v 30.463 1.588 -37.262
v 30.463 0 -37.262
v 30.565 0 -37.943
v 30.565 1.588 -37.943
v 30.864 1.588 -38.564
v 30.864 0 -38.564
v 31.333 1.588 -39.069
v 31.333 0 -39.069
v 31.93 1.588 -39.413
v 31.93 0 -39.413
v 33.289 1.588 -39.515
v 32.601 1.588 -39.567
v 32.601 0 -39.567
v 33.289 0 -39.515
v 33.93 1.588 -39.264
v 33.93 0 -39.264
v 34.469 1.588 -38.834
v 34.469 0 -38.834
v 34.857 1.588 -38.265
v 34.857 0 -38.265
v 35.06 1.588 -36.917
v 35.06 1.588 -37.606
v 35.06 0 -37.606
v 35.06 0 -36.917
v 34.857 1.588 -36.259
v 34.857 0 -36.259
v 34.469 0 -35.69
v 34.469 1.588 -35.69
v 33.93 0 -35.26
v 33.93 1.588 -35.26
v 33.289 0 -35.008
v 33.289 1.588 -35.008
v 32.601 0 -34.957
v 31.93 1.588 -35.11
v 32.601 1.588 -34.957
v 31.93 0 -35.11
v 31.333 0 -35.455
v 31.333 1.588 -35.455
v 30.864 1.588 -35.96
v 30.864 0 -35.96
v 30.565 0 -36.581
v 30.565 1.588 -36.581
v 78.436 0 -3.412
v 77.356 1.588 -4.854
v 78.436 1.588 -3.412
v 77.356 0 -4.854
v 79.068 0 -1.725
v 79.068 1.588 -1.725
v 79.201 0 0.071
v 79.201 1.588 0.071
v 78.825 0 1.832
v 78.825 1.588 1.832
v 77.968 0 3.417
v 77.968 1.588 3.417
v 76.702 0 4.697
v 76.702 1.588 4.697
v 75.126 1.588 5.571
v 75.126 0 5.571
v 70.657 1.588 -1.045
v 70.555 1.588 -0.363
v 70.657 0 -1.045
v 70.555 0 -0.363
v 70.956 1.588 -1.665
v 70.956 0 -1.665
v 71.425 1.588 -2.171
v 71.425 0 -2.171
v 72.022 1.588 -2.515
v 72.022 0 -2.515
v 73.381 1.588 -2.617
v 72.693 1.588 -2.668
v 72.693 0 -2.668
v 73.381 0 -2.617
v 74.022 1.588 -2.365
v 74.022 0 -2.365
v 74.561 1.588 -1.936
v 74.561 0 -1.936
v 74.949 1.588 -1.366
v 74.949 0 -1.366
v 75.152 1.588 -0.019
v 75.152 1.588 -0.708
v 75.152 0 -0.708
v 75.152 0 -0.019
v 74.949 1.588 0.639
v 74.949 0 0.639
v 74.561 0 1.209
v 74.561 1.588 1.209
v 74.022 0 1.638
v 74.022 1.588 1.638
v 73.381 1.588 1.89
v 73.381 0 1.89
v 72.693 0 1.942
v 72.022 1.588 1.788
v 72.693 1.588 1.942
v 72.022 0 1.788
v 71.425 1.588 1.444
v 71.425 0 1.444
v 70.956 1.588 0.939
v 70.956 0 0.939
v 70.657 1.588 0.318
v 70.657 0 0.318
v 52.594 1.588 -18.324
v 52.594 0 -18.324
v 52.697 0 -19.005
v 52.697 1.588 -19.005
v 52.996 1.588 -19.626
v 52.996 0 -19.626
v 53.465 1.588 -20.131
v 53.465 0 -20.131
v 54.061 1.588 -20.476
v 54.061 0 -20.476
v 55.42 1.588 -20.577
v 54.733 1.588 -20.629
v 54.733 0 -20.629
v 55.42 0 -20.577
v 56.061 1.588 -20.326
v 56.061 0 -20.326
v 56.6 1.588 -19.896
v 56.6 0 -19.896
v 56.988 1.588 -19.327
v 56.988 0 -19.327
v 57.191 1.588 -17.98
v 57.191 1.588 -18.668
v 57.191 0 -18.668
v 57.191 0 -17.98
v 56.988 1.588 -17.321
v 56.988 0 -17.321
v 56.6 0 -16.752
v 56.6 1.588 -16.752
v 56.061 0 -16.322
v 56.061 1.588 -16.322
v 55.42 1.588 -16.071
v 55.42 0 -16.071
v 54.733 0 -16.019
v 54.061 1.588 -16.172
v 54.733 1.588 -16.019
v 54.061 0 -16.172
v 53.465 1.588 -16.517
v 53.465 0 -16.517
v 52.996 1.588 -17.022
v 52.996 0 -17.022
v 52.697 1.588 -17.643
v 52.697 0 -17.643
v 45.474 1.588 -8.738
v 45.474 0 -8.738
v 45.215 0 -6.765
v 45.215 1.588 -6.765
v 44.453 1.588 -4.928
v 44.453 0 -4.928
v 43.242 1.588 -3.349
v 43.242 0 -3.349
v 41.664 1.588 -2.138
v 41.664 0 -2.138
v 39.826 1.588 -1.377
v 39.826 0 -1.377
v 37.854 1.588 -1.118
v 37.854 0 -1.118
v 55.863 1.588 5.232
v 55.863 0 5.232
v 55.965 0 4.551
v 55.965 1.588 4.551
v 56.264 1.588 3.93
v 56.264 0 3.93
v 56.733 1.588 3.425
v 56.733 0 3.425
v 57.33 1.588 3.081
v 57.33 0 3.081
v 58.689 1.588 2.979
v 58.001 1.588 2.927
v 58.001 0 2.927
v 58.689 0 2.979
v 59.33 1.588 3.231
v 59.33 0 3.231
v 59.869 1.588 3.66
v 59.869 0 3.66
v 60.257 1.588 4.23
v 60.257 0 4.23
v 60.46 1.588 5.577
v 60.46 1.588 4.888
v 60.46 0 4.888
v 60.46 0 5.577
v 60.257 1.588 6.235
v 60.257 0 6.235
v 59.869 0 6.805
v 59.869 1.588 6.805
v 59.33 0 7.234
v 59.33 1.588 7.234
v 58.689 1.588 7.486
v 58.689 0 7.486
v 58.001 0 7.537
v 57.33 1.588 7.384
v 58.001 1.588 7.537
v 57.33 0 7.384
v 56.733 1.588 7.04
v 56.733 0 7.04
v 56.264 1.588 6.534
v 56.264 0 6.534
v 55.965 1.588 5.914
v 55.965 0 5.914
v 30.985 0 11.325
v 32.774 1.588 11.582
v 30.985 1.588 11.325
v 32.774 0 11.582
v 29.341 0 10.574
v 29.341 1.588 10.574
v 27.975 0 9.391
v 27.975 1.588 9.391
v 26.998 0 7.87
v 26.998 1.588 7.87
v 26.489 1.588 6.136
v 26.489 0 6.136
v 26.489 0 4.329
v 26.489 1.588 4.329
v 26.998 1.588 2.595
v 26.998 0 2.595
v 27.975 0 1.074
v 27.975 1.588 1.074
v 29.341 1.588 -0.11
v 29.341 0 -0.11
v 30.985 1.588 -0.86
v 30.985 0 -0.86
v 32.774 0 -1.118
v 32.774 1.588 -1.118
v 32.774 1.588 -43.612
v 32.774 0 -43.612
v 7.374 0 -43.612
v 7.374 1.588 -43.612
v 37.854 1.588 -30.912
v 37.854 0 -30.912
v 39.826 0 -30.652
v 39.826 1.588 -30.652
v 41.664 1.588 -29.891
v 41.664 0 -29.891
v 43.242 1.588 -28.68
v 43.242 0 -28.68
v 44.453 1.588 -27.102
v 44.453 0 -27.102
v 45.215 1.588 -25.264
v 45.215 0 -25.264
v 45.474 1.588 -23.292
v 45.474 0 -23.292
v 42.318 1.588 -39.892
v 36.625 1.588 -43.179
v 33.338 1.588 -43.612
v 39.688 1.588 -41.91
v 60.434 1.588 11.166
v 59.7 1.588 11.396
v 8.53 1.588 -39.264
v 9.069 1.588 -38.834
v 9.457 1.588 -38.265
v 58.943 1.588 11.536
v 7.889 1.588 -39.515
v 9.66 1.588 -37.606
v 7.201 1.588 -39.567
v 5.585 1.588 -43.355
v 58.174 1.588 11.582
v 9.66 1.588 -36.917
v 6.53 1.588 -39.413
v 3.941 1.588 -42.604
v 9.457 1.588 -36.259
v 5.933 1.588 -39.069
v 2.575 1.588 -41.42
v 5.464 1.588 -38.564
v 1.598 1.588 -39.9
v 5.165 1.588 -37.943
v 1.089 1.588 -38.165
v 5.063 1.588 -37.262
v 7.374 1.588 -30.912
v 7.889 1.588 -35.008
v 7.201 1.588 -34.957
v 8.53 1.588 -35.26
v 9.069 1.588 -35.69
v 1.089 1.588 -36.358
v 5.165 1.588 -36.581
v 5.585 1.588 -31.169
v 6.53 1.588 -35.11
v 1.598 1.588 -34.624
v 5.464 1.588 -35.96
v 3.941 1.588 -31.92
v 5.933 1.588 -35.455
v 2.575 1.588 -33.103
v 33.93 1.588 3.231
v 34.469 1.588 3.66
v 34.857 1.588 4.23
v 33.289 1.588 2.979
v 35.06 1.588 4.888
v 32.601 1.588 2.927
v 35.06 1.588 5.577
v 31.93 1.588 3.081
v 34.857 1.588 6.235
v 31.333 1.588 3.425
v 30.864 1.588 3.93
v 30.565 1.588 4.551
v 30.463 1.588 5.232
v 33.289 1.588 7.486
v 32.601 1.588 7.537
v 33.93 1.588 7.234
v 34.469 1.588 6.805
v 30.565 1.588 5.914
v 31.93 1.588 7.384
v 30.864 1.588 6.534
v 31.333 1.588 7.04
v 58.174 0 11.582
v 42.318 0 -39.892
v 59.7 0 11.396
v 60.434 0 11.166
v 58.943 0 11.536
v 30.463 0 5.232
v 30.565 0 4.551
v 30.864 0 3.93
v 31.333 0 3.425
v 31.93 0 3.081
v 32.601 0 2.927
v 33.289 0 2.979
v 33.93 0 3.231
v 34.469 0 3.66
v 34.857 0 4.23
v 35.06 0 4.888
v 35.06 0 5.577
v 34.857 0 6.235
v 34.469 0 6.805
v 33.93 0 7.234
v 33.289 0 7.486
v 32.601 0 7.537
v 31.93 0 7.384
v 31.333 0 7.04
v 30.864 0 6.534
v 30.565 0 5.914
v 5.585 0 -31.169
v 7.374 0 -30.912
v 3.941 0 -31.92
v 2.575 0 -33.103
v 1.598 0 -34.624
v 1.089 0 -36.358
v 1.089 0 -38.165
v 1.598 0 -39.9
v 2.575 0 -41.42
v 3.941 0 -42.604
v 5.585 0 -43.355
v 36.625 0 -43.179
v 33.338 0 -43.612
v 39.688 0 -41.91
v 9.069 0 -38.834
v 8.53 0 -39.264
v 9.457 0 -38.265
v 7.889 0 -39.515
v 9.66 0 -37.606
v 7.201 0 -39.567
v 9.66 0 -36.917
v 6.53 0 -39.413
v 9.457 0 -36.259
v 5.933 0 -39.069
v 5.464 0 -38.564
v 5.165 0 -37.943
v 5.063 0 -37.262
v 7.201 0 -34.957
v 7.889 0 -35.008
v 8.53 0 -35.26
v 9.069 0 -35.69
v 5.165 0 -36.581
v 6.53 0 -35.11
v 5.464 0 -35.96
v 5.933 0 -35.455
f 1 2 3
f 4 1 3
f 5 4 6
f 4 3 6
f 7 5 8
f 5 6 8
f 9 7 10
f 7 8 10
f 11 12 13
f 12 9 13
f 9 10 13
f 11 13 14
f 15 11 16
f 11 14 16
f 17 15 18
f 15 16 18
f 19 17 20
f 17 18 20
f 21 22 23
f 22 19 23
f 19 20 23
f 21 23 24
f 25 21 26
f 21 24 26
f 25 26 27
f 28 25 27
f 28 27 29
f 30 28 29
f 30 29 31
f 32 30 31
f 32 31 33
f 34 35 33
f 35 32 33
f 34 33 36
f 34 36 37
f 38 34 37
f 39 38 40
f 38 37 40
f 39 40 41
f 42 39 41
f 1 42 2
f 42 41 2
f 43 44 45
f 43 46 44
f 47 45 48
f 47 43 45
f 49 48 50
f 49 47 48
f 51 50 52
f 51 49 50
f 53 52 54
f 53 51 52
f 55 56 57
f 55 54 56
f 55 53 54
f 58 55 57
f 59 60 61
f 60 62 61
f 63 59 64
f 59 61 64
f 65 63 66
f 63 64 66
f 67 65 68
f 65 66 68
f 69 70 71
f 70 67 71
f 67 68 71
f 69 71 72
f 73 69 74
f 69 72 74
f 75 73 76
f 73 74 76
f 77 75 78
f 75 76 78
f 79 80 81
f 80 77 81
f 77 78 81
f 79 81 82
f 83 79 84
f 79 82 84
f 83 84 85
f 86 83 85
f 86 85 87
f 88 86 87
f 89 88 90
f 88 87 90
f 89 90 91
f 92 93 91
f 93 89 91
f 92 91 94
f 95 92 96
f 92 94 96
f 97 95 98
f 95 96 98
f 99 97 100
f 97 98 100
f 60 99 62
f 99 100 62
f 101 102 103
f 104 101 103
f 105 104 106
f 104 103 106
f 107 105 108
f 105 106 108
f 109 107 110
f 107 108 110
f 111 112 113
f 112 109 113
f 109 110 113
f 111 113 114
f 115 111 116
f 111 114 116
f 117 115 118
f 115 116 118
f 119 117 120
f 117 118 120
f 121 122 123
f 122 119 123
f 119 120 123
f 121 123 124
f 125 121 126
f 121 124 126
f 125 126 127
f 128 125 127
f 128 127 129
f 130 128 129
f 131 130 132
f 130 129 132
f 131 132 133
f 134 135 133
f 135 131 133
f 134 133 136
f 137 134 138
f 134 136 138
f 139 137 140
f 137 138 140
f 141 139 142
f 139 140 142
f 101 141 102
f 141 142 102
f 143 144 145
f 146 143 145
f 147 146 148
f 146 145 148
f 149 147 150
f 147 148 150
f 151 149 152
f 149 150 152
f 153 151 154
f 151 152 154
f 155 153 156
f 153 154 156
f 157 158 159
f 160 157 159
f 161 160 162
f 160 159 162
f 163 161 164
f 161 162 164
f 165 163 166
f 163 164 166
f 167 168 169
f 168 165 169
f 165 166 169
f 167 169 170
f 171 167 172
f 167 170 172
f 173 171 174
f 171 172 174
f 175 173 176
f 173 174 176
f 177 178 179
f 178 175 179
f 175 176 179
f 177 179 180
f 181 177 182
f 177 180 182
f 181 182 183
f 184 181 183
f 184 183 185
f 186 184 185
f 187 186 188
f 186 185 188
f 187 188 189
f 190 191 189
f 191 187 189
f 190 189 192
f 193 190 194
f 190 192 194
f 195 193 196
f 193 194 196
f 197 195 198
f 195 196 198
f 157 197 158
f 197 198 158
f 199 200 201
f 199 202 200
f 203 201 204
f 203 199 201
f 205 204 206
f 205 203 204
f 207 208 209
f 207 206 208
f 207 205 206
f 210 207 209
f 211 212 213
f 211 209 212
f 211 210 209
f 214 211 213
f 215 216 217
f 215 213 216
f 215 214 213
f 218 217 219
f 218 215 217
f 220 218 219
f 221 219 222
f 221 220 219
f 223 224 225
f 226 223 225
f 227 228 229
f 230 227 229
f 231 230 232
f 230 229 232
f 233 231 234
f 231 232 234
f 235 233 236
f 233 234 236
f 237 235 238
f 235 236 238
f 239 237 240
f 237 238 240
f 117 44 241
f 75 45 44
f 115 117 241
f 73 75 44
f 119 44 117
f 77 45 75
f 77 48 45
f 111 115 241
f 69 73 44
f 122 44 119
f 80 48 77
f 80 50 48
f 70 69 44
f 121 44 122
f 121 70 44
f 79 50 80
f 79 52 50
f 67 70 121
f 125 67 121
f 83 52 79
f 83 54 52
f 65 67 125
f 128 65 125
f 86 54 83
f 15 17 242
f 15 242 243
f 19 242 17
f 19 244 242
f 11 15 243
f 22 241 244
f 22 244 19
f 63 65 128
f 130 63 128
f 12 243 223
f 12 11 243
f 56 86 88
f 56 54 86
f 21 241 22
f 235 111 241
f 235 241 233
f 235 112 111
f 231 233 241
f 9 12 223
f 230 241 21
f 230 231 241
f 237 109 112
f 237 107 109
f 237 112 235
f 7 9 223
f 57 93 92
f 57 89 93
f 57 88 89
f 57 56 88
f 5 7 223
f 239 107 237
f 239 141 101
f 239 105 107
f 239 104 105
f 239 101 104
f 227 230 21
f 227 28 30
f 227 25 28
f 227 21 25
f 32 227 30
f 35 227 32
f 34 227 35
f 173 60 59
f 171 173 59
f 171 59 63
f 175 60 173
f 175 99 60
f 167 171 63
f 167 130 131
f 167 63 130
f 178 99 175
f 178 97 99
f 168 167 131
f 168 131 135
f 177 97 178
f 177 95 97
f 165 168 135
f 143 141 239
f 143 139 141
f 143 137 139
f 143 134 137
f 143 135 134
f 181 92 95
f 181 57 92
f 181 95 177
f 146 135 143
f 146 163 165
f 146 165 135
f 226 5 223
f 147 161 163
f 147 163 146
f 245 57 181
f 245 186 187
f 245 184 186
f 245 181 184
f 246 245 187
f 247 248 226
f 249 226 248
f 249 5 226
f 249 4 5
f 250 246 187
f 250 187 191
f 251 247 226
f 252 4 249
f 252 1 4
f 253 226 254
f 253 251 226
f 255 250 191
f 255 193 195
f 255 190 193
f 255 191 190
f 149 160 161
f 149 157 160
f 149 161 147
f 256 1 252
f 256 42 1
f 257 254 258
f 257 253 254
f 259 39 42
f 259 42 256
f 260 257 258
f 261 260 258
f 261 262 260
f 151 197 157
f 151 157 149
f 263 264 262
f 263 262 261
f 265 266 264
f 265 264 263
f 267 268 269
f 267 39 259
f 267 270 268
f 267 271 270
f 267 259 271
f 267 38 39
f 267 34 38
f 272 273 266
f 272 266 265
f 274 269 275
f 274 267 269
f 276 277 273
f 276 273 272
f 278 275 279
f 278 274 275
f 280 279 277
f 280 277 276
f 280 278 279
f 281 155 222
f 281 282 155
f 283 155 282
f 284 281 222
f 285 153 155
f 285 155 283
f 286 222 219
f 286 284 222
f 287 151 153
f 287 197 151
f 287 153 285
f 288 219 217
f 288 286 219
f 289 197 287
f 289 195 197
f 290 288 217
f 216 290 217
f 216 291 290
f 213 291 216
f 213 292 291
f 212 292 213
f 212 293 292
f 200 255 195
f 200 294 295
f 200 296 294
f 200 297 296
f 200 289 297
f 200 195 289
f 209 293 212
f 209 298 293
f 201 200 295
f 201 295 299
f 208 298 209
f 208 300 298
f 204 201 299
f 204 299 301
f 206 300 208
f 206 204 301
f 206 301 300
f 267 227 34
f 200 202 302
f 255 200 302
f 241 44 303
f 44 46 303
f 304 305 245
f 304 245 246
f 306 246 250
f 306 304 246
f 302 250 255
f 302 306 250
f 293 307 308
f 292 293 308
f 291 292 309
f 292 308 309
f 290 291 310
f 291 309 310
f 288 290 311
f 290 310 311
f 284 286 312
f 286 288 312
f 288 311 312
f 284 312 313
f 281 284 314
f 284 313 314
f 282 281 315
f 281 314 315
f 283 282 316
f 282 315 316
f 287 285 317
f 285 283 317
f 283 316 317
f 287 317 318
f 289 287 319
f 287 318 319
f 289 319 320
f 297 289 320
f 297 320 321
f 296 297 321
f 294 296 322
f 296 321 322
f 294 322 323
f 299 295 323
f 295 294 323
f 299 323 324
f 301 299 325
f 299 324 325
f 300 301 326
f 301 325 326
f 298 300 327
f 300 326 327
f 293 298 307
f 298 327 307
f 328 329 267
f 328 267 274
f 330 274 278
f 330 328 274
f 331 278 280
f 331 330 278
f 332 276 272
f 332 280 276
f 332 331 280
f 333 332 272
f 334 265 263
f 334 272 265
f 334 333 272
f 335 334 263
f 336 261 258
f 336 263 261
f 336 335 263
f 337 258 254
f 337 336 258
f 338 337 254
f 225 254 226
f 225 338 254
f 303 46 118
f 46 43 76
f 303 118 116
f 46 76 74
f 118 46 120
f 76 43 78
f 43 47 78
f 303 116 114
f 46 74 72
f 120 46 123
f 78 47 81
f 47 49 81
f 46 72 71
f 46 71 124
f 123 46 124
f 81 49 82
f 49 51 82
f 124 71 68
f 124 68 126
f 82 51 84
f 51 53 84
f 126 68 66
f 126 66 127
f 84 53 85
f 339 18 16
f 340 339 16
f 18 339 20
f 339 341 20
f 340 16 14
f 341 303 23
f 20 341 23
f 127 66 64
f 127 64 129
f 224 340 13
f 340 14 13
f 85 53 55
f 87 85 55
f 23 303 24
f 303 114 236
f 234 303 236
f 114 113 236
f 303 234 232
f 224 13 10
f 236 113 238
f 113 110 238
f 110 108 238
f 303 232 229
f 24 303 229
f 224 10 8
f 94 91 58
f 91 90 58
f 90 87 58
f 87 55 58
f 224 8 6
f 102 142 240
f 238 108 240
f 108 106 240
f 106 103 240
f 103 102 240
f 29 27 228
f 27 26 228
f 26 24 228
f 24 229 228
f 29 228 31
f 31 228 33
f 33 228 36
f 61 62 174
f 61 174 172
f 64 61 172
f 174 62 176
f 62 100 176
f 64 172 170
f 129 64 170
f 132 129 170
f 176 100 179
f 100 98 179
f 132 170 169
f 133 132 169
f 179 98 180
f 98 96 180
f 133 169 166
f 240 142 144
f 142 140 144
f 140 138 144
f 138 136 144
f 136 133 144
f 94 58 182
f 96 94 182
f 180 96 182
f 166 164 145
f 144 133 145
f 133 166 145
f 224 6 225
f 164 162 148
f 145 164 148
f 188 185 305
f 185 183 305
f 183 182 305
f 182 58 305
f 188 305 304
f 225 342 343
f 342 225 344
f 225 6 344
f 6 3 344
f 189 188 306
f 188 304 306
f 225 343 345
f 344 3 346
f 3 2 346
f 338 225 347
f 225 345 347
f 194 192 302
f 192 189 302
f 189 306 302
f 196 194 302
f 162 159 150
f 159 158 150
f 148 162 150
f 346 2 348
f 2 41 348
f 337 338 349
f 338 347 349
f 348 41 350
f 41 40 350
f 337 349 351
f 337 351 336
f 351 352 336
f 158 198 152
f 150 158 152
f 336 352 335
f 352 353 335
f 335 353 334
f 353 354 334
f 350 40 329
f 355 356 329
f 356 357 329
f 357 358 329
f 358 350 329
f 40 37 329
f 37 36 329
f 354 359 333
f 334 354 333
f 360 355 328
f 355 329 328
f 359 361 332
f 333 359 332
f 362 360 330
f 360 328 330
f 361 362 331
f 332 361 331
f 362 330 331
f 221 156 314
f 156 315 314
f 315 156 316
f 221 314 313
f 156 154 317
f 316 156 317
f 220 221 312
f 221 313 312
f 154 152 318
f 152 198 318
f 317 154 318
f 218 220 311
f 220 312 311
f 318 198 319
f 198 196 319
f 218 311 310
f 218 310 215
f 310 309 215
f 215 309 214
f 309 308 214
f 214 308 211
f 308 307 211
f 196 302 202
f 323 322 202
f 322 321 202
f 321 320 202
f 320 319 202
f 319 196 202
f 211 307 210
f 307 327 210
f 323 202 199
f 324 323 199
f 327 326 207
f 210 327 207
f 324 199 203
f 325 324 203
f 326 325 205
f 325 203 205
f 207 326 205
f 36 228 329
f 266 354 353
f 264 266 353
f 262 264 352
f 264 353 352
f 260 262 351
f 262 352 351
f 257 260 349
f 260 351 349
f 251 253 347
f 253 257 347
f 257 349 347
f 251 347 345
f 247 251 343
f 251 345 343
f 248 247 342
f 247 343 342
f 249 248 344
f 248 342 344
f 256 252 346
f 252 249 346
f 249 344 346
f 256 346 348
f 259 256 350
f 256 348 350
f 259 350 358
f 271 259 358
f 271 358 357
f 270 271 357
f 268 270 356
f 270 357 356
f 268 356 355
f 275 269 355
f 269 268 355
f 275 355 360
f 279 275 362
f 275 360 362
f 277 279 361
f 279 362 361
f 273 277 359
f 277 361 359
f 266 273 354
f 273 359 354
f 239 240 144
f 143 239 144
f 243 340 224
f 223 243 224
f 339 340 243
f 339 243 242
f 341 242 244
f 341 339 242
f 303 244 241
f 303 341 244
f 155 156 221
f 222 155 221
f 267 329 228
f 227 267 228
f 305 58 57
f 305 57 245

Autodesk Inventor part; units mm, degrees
ref_plane "YZ Plane" through (0, 0, 0) normal (1, 0, 0) x (0, 1, 0)
ref_plane "XZ Plane" through (0, 0, 0) normal (0, 1, 0) x (-1, 0, 0)
ref_plane "XY Plane" through (0, 0, 0) normal (0, 0, 1) x (1, 0, 0)
sketch "Sketch1" plane through (0, 0, 0) normal (0, 1, 0) x (-1, 0, 0)
  line L0 (-37.8542, -1.1176) -> (-32.7742, -1.1176)
  line L1 (-7.3742, -30.9118) -> (-37.8542, -30.9118)
  line L2 (-45.4742, -23.2918) -> (-45.4742, -8.7376)
  arc A0 (-37.8542, -1.1176) -> (-45.4742, -8.7376) centre (-37.8542, -8.7376) ccw
  arc A1 (-45.4742, -23.2918) -> (-37.8542, -30.9118) centre (-37.8542, -23.2918) ccw
  circle A2 centre (-72.8662, -0.3634) radius 2.3114
  circle A3 centre (-54.9057, -18.324) radius 2.3114
  circle A4 centre (-58.1742, 5.2324) radius 2.3114
  circle A5 centre (-32.7742, 5.2324) radius 2.3114
  circle A6 centre (-32.7742, -37.2618) radius 2.3114
  circle A7 centre (-7.3742, -37.2618) radius 2.3114
  arc A8 (-75.1264, 5.5707) -> (-77.3564, -4.8536) centre (-72.8662, -0.3634) ccw
  arc A9 (-32.7742, -43.6118) -> (-31.4271, -43.4673) centre (-32.7742, -37.2618) ccw
  arc A10 (-7.3742, -43.6118) -> (-7.3742, -30.9118) centre (-7.3742, -37.2618) ccw
  arc A11 (-32.7742, -1.1176) -> (-32.7742, 11.5824) centre (-32.7742, 5.2324) ccw
  arc A12 (-58.1742, 11.5824) -> (-60.4344, 11.1665) centre (-58.1742, 5.2324) ccw
  line L3 (-32.7742, 11.5824) -> (-58.1742, 11.5824)
  line L4 (-75.1264, 5.5707) -> (-60.4344, 11.1665)
  line L5 (-77.3564, -4.8536) -> (-42.3179, -39.8921)
  line L6 (-33.3376, -43.6118) -> (-7.3742, -43.6118)
  arc A13 (-42.3179, -39.8921) -> (-33.3376, -43.6118) centre (-33.3376, -30.9118) ccw
  line L7 (-37.8542, -1.1176) -> (-32.7742, -1.1176)
  point P0 (0, 0)
  point P1 (-45.4742, -30.9118)
  dimension "d2" = 7.62
  dimension "d20" = 12.7
  dimension "d21" = 29.7942
extrude "Extrusion1" add sketch "Sketch1" along normal blind 1.5875
properties part number "gusset-2-3.25-half"
